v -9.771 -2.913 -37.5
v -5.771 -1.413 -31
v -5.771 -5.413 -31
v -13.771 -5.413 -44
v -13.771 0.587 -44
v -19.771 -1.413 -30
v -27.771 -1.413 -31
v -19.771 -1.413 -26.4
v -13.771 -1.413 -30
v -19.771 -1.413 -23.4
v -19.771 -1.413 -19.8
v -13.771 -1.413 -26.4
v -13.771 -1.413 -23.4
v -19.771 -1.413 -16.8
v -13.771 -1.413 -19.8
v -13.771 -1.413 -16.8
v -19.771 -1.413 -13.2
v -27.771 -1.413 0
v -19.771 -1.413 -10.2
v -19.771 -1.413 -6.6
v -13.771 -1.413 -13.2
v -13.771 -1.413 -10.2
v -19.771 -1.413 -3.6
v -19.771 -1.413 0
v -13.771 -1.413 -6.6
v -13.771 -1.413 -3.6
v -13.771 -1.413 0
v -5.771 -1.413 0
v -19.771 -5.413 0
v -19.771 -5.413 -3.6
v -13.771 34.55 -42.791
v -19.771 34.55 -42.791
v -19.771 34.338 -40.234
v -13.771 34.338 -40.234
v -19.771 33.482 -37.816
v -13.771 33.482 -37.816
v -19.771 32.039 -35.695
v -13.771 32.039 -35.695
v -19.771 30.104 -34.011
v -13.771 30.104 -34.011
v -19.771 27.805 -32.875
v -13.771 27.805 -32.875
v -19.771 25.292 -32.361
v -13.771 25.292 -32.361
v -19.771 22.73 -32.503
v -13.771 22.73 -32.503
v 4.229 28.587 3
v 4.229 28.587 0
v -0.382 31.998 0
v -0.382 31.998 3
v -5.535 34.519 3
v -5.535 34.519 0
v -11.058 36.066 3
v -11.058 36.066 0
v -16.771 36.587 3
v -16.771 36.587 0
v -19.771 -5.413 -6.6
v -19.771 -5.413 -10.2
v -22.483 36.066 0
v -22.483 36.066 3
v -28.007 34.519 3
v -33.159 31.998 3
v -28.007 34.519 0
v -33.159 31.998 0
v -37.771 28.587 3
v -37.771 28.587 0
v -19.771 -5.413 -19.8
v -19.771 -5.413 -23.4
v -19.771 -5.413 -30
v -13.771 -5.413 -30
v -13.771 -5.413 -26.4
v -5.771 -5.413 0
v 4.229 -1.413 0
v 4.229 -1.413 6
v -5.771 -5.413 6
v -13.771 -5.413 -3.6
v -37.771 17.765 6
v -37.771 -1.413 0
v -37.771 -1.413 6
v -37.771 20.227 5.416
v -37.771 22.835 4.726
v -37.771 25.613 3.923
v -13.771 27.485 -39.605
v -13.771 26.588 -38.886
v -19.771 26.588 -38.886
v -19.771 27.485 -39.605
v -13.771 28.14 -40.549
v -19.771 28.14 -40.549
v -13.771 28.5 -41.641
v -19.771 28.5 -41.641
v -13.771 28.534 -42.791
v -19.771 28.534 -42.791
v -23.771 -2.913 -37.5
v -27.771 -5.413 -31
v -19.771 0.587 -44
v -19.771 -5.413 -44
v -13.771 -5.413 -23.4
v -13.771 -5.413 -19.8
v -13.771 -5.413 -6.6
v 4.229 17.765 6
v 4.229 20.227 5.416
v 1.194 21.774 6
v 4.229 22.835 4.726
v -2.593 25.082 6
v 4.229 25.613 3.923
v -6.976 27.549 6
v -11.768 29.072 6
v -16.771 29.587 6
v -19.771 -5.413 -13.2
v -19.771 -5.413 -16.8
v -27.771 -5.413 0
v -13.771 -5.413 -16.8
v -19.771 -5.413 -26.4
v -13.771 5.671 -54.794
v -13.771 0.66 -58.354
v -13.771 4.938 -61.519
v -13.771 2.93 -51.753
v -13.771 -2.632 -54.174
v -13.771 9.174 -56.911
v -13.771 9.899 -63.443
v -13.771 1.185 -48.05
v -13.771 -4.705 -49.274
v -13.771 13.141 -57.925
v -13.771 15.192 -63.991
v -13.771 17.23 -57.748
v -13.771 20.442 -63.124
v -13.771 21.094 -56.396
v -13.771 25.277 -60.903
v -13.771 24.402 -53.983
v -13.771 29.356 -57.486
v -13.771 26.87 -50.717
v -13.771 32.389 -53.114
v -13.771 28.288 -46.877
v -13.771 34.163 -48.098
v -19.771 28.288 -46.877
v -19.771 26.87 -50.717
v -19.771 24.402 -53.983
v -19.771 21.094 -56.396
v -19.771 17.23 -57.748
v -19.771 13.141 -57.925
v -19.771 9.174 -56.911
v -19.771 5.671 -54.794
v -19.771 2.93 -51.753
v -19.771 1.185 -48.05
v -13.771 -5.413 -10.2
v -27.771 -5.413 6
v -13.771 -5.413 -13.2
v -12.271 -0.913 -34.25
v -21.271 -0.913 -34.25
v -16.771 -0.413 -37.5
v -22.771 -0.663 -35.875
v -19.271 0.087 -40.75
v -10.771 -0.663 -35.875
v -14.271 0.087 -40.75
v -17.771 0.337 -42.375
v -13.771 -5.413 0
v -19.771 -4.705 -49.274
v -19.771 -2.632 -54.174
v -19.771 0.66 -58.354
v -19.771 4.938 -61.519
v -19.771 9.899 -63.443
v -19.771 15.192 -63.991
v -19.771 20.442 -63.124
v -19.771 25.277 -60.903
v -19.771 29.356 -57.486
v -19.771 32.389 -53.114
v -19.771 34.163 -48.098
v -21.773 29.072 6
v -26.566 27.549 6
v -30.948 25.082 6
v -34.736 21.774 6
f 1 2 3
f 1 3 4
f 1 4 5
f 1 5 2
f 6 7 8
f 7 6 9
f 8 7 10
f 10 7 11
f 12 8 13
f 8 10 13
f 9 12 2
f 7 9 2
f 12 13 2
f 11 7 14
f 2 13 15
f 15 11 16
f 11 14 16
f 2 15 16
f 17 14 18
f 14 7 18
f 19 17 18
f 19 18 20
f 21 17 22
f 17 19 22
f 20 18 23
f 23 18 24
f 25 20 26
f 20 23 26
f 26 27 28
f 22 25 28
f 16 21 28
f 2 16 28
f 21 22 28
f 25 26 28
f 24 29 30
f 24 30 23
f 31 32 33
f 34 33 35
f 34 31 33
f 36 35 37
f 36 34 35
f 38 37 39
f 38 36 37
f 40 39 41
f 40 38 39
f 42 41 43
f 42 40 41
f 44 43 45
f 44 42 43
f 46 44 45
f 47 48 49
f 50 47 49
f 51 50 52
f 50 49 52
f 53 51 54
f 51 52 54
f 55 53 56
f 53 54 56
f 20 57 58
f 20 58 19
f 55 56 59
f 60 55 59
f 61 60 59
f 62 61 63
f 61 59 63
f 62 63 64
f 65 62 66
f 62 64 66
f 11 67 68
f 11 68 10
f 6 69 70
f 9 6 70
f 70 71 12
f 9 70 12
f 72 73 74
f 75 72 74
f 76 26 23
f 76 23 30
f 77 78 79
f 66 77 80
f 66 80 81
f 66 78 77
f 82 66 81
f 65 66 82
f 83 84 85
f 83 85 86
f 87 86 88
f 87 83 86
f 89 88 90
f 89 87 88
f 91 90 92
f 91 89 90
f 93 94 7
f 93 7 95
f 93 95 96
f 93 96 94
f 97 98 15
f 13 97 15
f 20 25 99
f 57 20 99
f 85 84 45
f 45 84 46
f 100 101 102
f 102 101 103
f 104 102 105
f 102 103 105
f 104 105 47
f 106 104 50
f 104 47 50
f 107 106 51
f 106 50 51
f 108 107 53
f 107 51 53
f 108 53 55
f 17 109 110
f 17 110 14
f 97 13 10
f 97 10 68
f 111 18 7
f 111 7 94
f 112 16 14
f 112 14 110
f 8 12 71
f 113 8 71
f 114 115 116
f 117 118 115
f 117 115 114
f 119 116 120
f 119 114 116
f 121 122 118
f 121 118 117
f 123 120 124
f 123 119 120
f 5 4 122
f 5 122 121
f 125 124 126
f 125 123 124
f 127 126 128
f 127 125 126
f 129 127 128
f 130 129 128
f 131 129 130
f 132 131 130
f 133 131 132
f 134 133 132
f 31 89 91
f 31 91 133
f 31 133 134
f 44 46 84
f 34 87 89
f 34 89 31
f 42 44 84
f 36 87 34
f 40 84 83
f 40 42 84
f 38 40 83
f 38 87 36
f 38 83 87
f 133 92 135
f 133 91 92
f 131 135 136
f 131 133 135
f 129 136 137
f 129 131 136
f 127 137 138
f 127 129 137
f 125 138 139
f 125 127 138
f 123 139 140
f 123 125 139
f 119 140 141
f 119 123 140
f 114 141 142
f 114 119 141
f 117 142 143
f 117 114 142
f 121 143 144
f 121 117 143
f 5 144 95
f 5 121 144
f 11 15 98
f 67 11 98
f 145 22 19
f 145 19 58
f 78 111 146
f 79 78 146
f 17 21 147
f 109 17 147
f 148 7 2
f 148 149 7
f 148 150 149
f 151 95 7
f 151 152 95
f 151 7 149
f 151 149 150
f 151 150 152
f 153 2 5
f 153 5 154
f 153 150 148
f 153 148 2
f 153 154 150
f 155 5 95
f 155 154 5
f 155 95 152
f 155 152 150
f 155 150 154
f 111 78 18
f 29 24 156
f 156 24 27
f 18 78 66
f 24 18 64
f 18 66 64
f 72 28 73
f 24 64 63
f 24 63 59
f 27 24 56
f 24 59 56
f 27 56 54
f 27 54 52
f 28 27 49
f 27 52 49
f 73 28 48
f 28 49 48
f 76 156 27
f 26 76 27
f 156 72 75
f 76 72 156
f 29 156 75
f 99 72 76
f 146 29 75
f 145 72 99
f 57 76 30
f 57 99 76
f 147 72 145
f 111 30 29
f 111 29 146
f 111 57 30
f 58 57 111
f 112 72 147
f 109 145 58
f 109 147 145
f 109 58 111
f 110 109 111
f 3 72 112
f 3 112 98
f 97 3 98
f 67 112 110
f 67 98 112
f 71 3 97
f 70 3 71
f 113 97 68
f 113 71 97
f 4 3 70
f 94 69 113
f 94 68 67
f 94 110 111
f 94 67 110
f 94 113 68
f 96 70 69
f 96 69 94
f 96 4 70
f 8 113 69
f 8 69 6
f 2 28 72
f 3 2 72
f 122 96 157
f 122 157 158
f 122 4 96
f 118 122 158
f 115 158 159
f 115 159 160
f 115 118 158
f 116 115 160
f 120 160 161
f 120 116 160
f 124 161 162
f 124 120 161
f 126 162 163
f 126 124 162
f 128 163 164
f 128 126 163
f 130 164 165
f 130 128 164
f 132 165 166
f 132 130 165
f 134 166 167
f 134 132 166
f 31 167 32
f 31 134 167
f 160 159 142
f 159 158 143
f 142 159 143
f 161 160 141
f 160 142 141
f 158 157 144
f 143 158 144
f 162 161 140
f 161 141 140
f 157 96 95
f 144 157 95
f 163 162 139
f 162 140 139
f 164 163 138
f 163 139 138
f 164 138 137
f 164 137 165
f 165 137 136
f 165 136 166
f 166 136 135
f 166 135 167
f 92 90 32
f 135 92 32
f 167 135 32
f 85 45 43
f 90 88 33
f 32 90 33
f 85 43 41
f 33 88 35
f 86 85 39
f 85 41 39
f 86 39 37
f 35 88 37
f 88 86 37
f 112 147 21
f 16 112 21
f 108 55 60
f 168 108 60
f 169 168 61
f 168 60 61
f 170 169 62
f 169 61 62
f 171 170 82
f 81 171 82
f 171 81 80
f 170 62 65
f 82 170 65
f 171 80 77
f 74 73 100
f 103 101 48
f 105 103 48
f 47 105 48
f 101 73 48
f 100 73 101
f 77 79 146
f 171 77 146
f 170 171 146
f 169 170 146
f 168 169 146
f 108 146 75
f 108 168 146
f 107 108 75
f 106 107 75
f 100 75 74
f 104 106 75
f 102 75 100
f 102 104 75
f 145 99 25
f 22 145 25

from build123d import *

# Parameters (mm, degrees)
F1_DEPTH    = 6
F2_W        = 8
F2_H        = 4
F3_DEPTH    = 36
F4_DEPTH    = 4
F5_C1_SIZE2 = 10
F5_C1_SIZE  = 4
F5_C2_SIZE2 = 10
F5_C2_SIZE  = 4
F6_W        = 4
F6_H        = 3
F7_DEPTH    = 6
F10_DEPTH   = 3
F11_W       = 14
F11_H       = 4
F11_W_2     = 8
F12_DEPTH   = 1
F12_FACE_W  = 22
F12_FACE_H  = 4
F10_FACE_W  = 6
F10_FACE_H  = 6
F15_DEPTH   = 109
F16_SIZE2   = 3
F16_SIZE    = 7


# Not quite as in the source:
# - an extrude ends at something that could not be found from the text; its depth is read off the source's solid


with BuildPart() as f1:
    # F0 (on Top) → F1 (new body)
    with BuildSketch(Plane.XY):
        with BuildLine():
            ThreePointArc((4.2292630374, 28.5867799968), (-5.5346345873, 34.5190491883), (-16.7707372875, 36.5867799968))
            ThreePointArc((-16.7707372875, 36.5867799968), (-28.0068396415, 34.5190490726), (-37.7707369626, 28.5867799968))
            Line((-37.7707369626, 28.5867799968), (-37.7707369626, -1.4132200032))
            Line((-37.7707369626, -1.4132200032), (4.2292630374, -1.4132200032))
            Line((4.2292630374, -1.4132200032), (4.2292630374, 28.5867799968))
        make_face()
    extrude(amount=F1_DEPTH)

    # F2 (on face) → F3 (join)
    with BuildSketch(Plane.XY.offset(6)):
        with Locations((-23.7707369626, -3.4132200032)):
            Rectangle(F2_W, F2_H)
        with Locations((-9.7707369626, -3.4132200032)):
            Rectangle(F2_W, F2_H)
    extrude(amount=-F3_DEPTH)

    # F4 (add): faces of the model
    f4_faces = [f1.faces().sort_by_distance(p)[0] for p in [
        (-32.7707369626, -1.4132200032, 3),
        (-0.7707369626, -1.4132200032, 3),
        (-16.7707369626, -1.4132200032, 3),
    ]]
    extrude(f4_faces, amount=F4_DEPTH)

    # F5: chamfer of 10 x 4 on 2 edges, made by hand

    # F5_c1
    f5_c1_edges = [f1.edges().sort_by_distance(p)[0] for p in [
        (-37.7707369626, -5.4132200032, 3),
    ]]
    f5_c1_side = f1.faces().sort_by_distance((-37.7707369626, -5.3332200032, 3))[0]
    chamfer(f5_c1_edges, length=F5_C1_SIZE, length2=F5_C1_SIZE2, reference=f5_c1_side)

    # F5_c2
    f5_c2_edges = [f1.edges().sort_by_distance(p)[0] for p in [
        (4.2292630374, -5.4132200032, 3),
    ]]
    f5_c2_side = f1.faces().sort_by_distance((4.2292630374, -5.3332200032, 3))[0]
    chamfer(f5_c2_edges, length=F5_C2_SIZE, length2=F5_C2_SIZE2, reference=f5_c2_side)

    # F6 (on face) → F7 (join, through all)
    with BuildSketch(Plane(origin=(-13.7707369626, 0, 0), x_dir=(0, -1, 0), z_dir=(-1, 0, 0))):
        with Locations((3.4132200032, -24.9)):
            Rectangle(F6_W, F6_H)
        with Locations((3.4132200032, -18.3)):
            Rectangle(F6_W, F6_H)
        with Locations((3.4132200032, -11.7)):
            Rectangle(F6_W, F6_H)
        with Locations((3.4132200032, -5.1)):
            Rectangle(F6_W, F6_H)
    extrude(amount=F7_DEPTH)

    # F11 (on face) → F12 (join)
    with BuildSketch(Plane(origin=(0, 0, -30), x_dir=(1, 0, 0), z_dir=(0, 0, -1))):
        with Locations((-12.7707369626, 3.4132200032)):
            Rectangle(F11_W, F11_H)
        with Locations((-23.7707369626, 3.4132200032)):
            Rectangle(F11_W_2, F11_H)
    extrude(amount=F12_DEPTH)



with BuildPart() as f10:
    # F9 (on line) → F10 (new body, symmetric)
    with BuildSketch(Plane.YZ.offset(-16.7707369626)):
        with BuildLine():
            ThreePointArc((-5.4132200032, -44), (15.1917157006, -63.9908492264), (34.5501852762, -42.7906821553))
            ThreePointArc((34.5501852762, -42.7906821553), (24.5246696764, -32.3338991708), (14.5746107682, -42.8625078704))
            Line((14.5746107682, -42.8625078704), (20.5957170737, -42.8625078704))
            ThreePointArc((20.5957170737, -42.8625078704), (24.5244376896, -38.3339982315), (28.5344518581, -42.7906821553))
            ThreePointArc((28.5344518581, -42.7906821553), (15.1920047243, -57.9869118475), (0.5867799968, -44))
            Line((0.5867799968, -44), (-5.4132200032, -44))
        make_face()
    extrude(amount=F10_DEPTH, both=True)


with BuildPart() as f1_1:
    add(f1.part)

    add(f10.part)  # F13 merges F10
    # F12_face (on face) → F13 section 0
    with BuildSketch(Plane(origin=(-16.7707369626, -3.4132200032, -31), x_dir=(1, 0, 0), z_dir=(0, 0, -1))):
        Rectangle(F12_FACE_W, F12_FACE_H)
    # F10_face (on face) → F13 section 1
    with BuildSketch(Plane(origin=(-16.7707369626, -2.4132200032, -44), x_dir=(1, 0, 0), z_dir=(0, 0, 1))):
        Rectangle(F10_FACE_W, F10_FACE_H)
    loft()

    # F14 (on face) → F15 (cut, through all)
    with BuildSketch(Plane.YZ.offset(-13.7707369626)):
        with BuildLine():
            Line((22.7304068946, -32.502746223), (21.8552816659, -31.0546644032))
            Line((21.8552816659, -31.0546644032), (14.088241172, -33.6755602773))
            Line((14.088241172, -33.6755602773), (14.5746107682, -42.8625078704))
            ThreePointArc((14.5746107682, -42.8625078704), (16.7033355644, -36.1481265127), (22.7304068946, -32.502746223))
        make_face()
        with BuildLine():
            Line((26.5877404927, -38.885529479), (22.7304068946, -32.502746223))
            ThreePointArc((22.7304068946, -32.502746223), (16.7033355644, -36.1481265127), (14.5746107682, -42.8625078704))
            Line((14.5746107682, -42.8625078704), (20.5957170737, -42.8625078704))
            ThreePointArc((20.5957170737, -42.8625078704), (22.3486471202, -39.0010956404), (26.5877404927, -38.885529479))
        make_face()
    extrude(amount=-F15_DEPTH, mode=Mode.SUBTRACT)

    # F16
    f16_edges = [f1_1.edges().sort_by_distance(p)[0] for p in [
        (-16.770737, 36.58678, 6),
    ]]
    f16_side = f1_1.faces().sort_by_distance((-16.770737, 14.854781, 6))[0]
    chamfer(f16_edges, length=F16_SIZE, length2=F16_SIZE2, reference=f16_side)


solid = f1_1.part
